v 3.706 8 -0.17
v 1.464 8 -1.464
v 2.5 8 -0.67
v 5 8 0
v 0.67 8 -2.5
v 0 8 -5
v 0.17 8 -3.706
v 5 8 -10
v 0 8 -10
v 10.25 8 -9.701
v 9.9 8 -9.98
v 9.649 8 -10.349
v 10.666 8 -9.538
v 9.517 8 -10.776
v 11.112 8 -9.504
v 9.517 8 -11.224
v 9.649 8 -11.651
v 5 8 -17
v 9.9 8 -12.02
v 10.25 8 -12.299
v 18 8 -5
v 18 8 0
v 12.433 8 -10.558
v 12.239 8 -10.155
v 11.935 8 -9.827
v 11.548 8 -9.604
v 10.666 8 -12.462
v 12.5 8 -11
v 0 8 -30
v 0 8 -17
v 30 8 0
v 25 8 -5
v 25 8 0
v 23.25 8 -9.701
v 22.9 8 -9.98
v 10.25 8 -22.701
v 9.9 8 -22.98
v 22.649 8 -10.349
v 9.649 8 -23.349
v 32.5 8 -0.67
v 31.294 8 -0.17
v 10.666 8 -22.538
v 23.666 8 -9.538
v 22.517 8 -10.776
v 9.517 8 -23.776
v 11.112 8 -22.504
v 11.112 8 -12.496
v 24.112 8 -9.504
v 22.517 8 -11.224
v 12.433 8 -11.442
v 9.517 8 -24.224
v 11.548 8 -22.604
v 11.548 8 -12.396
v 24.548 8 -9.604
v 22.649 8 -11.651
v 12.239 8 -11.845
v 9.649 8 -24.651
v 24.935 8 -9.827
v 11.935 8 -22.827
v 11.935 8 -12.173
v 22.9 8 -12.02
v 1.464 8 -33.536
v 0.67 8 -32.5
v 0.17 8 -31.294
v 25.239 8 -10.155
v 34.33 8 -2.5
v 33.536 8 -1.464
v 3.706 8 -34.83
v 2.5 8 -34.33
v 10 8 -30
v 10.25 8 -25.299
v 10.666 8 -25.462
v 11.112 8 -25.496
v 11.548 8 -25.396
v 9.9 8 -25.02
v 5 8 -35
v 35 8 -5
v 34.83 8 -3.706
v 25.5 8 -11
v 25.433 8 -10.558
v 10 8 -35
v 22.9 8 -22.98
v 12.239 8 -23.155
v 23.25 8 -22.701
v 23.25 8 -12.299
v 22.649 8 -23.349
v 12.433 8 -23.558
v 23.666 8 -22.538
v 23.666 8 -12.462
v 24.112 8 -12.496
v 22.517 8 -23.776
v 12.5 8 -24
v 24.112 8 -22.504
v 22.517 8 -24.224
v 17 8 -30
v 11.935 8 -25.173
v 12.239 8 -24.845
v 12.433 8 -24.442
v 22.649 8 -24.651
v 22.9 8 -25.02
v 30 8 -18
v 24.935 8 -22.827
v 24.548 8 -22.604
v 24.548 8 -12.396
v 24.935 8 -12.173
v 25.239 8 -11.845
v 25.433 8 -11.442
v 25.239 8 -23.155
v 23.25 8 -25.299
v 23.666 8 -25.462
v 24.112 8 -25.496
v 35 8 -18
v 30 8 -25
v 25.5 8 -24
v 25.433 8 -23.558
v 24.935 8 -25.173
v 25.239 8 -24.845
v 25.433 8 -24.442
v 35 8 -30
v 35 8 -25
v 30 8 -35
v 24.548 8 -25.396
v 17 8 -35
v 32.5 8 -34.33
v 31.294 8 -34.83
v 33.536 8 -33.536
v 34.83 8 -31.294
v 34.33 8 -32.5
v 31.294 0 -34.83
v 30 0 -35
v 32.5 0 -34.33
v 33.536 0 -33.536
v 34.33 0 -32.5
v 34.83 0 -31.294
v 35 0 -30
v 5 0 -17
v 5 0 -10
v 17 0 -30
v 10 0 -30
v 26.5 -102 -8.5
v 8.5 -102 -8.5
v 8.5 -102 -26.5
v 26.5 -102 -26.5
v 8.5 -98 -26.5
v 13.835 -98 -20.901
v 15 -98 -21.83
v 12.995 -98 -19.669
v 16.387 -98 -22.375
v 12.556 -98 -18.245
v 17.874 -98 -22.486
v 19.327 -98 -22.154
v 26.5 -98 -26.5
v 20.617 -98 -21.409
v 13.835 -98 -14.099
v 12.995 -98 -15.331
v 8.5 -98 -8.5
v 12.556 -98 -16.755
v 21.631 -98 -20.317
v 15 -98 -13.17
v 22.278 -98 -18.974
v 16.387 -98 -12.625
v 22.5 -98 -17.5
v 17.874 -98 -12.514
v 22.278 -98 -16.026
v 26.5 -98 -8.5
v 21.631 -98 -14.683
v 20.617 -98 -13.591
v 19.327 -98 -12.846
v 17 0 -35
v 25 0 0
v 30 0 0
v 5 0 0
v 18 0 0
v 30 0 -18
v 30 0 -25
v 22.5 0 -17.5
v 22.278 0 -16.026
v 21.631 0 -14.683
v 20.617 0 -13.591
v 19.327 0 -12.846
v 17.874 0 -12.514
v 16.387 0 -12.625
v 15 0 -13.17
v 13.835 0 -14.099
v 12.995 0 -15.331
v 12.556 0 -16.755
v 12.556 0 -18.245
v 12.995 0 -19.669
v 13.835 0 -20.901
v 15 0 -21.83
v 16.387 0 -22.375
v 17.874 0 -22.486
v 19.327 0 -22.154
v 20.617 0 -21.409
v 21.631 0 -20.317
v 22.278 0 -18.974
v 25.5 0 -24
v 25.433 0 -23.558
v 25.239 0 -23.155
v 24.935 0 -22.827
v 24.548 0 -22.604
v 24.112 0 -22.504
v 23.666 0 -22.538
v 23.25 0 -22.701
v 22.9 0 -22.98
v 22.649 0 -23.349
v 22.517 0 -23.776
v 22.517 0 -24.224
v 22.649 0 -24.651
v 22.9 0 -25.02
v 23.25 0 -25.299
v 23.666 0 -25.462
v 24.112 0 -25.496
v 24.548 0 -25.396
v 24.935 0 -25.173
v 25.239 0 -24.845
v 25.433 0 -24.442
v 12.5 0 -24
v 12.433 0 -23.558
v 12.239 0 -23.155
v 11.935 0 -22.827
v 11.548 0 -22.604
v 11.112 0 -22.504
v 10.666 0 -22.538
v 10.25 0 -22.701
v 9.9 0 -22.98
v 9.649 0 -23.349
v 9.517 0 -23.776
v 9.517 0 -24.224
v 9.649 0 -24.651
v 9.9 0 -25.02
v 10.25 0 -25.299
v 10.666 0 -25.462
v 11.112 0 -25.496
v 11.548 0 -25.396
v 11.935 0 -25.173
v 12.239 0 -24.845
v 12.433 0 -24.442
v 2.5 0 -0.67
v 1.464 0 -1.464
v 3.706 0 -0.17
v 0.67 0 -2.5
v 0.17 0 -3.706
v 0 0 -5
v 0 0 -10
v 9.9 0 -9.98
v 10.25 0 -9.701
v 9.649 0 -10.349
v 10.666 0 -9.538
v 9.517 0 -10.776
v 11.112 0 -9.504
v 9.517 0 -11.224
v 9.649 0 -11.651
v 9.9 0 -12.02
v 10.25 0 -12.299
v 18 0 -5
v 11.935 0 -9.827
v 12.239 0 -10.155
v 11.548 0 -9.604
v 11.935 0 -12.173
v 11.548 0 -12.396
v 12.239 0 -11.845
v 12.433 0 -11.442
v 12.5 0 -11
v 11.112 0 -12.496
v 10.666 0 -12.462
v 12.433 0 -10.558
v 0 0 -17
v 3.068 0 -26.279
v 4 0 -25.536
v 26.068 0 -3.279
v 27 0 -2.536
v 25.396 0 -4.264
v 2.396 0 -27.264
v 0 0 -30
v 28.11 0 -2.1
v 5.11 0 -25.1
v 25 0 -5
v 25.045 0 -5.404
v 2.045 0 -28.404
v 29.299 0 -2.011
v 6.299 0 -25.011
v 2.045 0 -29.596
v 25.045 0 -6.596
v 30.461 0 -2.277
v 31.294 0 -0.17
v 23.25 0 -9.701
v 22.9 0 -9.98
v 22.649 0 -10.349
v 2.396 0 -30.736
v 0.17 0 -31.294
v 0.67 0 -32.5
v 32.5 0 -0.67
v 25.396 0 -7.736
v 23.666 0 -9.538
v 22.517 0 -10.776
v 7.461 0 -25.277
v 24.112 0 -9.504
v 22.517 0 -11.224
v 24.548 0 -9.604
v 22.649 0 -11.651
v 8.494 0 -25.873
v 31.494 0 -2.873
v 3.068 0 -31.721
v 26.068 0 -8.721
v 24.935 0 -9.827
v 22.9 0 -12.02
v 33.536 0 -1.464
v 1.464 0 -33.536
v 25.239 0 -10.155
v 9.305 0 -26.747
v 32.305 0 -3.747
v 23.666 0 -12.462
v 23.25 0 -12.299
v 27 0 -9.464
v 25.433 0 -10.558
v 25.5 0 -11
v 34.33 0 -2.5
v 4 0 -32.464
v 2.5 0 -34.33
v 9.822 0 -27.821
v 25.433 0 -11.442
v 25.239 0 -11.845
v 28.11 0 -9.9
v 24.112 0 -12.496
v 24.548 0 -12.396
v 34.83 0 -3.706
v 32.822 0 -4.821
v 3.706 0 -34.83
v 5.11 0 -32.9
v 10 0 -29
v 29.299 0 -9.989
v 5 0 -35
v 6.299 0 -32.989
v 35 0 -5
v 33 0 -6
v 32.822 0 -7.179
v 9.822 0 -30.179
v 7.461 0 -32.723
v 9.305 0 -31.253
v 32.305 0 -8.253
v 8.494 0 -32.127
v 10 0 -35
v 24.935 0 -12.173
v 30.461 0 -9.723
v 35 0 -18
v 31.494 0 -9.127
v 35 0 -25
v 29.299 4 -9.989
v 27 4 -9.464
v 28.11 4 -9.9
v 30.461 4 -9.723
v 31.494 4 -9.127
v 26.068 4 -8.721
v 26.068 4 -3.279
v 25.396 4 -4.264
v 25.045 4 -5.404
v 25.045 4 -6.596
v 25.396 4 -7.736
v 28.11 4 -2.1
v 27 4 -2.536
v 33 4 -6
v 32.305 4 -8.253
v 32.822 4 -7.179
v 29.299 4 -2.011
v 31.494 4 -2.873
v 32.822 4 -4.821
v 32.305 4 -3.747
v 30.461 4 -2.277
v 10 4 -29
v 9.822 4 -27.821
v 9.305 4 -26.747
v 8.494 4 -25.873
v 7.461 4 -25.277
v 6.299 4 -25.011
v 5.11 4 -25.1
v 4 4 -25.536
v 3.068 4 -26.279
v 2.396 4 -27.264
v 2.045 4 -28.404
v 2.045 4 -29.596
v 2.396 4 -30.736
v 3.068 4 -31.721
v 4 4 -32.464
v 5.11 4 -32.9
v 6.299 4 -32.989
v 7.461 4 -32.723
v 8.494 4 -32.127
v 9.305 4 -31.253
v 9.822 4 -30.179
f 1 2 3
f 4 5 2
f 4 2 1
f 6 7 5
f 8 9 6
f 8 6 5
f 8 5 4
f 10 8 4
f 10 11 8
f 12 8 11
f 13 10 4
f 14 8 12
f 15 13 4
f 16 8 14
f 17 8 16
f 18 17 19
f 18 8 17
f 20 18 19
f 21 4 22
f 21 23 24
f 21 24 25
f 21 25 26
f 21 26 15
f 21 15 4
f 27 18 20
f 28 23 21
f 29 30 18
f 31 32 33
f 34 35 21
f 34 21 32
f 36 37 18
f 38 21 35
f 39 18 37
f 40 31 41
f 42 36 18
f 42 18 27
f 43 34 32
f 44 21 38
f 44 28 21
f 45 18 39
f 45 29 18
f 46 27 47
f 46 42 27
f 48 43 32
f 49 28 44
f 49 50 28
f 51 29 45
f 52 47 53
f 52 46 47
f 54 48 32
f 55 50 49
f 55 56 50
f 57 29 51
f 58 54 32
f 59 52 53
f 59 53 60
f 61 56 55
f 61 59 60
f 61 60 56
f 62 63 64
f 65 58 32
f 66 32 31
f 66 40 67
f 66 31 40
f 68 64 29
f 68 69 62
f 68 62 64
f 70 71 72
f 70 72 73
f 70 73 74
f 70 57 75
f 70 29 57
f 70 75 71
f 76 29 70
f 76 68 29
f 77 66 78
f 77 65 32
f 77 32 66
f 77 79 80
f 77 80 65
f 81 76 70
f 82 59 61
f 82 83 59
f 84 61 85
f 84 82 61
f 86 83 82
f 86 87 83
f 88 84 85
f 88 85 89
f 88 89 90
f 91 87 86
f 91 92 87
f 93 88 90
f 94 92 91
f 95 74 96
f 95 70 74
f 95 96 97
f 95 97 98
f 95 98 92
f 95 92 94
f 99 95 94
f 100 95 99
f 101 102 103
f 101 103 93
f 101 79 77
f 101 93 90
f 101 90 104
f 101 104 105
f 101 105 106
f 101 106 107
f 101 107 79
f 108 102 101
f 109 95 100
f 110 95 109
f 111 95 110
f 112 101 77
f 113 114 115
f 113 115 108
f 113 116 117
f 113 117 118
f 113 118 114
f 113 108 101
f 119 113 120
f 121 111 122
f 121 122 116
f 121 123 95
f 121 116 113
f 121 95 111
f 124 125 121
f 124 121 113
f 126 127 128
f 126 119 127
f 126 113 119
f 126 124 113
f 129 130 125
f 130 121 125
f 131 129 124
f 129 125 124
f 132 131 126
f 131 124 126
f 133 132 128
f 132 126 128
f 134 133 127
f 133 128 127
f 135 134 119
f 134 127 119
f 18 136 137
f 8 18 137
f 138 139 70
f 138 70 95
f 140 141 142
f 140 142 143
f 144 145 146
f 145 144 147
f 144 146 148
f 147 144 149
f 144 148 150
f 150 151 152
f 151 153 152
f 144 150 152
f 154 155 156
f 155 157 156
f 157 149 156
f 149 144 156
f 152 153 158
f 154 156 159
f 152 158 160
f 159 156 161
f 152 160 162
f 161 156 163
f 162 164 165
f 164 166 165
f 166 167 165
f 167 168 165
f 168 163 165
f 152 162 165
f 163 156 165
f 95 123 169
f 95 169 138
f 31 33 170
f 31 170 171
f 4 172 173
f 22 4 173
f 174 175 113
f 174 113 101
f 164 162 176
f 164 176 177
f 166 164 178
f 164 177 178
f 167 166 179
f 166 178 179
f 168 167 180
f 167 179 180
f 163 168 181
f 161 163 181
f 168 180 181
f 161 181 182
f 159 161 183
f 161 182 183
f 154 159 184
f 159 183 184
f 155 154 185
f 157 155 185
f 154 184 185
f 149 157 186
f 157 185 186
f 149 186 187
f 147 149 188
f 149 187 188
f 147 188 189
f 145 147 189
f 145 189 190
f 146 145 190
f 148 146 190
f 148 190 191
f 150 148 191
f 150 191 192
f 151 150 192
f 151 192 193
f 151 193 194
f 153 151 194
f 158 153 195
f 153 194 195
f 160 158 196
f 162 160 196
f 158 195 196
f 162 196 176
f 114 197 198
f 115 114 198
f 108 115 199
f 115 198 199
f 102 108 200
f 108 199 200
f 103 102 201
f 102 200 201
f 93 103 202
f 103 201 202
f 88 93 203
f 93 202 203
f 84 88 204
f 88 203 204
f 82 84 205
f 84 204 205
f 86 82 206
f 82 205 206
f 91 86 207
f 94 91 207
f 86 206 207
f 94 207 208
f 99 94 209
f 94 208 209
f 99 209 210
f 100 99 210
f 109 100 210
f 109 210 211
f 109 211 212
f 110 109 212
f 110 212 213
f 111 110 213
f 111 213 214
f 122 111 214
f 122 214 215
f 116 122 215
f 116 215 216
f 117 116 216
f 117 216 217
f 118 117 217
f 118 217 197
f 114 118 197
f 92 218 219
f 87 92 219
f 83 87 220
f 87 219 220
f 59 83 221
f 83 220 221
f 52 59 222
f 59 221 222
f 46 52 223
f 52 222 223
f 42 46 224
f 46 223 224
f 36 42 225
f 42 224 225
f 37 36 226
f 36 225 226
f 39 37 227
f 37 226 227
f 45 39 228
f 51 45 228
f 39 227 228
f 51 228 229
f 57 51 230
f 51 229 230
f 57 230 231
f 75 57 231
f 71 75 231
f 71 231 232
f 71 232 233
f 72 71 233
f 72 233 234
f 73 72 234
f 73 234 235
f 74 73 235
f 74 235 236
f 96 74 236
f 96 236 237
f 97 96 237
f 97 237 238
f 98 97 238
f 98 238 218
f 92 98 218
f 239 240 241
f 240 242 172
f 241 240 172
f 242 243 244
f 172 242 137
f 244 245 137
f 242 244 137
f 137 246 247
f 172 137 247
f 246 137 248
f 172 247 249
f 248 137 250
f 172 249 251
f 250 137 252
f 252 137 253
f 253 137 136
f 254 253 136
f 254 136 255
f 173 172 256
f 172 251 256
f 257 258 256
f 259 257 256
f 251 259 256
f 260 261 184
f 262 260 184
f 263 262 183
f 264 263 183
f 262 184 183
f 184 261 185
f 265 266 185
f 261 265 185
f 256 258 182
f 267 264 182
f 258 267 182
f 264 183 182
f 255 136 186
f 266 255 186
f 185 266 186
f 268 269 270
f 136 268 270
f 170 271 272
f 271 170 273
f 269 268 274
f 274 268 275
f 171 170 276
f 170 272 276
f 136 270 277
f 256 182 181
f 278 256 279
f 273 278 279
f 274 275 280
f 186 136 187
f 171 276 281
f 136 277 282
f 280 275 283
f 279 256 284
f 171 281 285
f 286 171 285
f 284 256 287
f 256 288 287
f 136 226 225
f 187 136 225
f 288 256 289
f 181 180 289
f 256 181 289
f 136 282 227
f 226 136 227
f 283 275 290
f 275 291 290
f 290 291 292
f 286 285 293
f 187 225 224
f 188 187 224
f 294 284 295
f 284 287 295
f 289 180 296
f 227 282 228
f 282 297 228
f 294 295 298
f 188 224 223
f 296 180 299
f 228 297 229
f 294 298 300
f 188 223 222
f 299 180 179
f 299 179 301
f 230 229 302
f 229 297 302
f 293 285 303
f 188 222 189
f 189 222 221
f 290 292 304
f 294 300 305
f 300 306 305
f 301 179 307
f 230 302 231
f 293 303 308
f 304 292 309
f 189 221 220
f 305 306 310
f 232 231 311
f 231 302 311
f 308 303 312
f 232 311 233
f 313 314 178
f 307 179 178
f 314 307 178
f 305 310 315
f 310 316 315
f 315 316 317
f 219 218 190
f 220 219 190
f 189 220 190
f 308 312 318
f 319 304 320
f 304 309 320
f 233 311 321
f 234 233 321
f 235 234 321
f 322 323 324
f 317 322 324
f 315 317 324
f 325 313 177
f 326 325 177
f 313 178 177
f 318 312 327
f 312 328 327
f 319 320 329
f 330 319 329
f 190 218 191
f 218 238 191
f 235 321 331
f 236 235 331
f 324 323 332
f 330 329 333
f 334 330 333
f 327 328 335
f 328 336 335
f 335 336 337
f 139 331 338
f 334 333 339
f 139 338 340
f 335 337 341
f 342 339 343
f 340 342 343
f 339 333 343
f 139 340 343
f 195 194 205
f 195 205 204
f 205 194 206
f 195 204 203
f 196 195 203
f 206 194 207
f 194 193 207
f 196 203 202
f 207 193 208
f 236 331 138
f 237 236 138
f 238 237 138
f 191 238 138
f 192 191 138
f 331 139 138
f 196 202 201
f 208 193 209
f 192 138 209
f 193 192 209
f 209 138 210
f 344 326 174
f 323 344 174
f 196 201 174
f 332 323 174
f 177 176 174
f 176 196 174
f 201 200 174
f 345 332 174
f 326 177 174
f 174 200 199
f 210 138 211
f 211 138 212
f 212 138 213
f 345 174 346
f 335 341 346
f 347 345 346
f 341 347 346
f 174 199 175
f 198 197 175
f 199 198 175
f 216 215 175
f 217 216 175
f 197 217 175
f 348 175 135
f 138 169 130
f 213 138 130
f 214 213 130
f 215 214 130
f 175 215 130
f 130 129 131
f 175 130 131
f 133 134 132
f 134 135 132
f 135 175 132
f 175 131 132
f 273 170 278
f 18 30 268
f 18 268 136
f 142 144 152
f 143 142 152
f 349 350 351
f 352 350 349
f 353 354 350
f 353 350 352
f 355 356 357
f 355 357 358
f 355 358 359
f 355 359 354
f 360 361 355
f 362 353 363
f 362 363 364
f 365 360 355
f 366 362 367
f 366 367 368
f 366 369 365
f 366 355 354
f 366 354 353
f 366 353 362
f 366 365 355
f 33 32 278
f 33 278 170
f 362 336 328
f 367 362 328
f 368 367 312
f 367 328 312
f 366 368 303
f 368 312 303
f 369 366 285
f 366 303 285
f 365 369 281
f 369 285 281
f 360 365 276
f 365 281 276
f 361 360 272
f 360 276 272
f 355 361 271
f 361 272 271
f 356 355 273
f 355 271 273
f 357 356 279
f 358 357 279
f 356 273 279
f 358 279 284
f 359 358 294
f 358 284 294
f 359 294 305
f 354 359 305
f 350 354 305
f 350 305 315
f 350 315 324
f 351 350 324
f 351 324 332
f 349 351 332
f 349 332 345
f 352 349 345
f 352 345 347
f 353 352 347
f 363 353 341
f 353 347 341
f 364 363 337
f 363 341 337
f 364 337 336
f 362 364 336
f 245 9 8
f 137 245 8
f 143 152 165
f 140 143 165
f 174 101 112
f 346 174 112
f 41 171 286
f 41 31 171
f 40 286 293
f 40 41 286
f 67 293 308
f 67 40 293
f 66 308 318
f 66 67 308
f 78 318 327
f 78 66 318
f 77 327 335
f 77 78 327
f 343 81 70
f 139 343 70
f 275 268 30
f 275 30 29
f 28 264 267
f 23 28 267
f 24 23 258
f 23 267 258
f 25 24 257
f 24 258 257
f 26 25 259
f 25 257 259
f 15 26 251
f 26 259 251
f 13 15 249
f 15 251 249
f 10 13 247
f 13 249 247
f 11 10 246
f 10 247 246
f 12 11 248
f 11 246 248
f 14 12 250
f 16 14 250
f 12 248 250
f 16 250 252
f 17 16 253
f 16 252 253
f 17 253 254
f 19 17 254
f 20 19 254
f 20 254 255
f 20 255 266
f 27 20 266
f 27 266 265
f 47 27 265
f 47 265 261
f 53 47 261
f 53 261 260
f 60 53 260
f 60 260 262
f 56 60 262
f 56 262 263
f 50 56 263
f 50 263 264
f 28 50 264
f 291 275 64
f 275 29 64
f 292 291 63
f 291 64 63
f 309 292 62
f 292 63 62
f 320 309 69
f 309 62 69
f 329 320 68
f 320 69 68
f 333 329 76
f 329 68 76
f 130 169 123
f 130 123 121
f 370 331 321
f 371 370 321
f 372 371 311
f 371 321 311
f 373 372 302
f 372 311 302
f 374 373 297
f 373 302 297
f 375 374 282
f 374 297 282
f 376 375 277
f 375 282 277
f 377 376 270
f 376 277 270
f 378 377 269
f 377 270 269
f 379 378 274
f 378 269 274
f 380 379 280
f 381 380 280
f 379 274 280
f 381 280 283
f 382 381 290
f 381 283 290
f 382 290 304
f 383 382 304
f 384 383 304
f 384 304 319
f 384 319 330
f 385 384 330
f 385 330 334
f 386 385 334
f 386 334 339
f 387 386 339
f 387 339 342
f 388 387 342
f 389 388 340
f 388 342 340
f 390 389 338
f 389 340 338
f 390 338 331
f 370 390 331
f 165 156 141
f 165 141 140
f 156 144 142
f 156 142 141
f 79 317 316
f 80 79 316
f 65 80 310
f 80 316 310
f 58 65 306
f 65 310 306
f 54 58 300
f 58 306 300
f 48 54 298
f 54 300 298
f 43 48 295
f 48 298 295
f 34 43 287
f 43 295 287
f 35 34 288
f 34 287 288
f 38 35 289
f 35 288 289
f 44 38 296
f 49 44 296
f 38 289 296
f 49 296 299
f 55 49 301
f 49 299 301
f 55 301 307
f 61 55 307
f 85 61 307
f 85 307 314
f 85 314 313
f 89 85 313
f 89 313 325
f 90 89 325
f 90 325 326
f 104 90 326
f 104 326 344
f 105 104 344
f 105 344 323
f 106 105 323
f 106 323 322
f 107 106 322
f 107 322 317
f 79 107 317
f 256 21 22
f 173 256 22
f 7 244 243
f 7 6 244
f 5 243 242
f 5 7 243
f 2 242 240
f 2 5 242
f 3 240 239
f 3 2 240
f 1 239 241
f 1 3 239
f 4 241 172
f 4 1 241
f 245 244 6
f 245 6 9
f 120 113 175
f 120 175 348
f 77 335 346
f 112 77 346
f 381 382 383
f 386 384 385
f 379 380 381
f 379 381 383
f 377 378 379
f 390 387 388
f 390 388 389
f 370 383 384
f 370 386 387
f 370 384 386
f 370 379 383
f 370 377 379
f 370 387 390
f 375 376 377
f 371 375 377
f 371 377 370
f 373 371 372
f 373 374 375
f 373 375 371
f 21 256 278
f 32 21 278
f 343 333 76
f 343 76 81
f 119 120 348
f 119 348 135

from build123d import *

# Parameters (mm, degrees)
SKETCH1_W           = 35
SKETCH1_H           = 35
BOSS_EXTRUDE1_DEPTH = 8
SKETCH2_W           = 7
SKETCH2_H           = 5
SKETCH2_W_2         = 5
SKETCH2_H_2         = 7
SKETCH2_R           = 1.5
CUT_EXTRUDE1_DEPTH  = 51.139804547
SKETCH2_5_R         = 4
SKETCH2_5_R_2       = 1.5
CUT_EXTRUDE2_DEPTH  = 4
SKETCH2_7_R         = 5
BOSS_EXTRUDE2_DEPTH = 98
SKETCH4_W           = 18
SKETCH4_H           = 18
BOSS_EXTRUDE3_DEPTH = 4
FILLET2_R           = 5


with BuildPart() as part:
    # Sketch1 → Boss-Extrude1 (new body)
    with BuildSketch(Plane(origin=(0, 0, 0), x_dir=(1, 0, 0), z_dir=(0, 1, 0))):
        with Locations((17.5, 17.5)):
            Rectangle(SKETCH1_W, SKETCH1_H)
    extrude(amount=BOSS_EXTRUDE1_DEPTH)

    # Sketch2 → Cut-Extrude1 (cut, through all)
    with BuildSketch(Plane.XZ):
        with Locations((21.5, -2.5)):
            Rectangle(SKETCH2_W, SKETCH2_H)
        with Locations((2.5, -13.5)):
            Rectangle(SKETCH2_W_2, SKETCH2_H_2)
        with Locations((32.5, -21.5)):
            Rectangle(SKETCH2_W_2, SKETCH2_H_2)
        with Locations((13.5, -32.5)):
            Rectangle(SKETCH2_W, SKETCH2_H)
        with Locations((11, -11)):
            Circle(SKETCH2_R)
        with Locations((24, -11)):
            Circle(SKETCH2_R)
        with Locations((24, -24)):
            Circle(SKETCH2_R)
        with Locations((11, -24)):
            Circle(SKETCH2_R)
    extrude(amount=-CUT_EXTRUDE1_DEPTH, mode=Mode.SUBTRACT)

    # Sketch2<5> → Cut-Extrude2 (cut)
    with BuildSketch(Plane.XZ):
        with Locations((29, -6)):
            Circle(SKETCH2_5_R)
        with Locations((6, -29)):
            Circle(SKETCH2_5_R)
        with Locations((11, -11)):
            Circle(SKETCH2_5_R_2)
    extrude(amount=-CUT_EXTRUDE2_DEPTH, mode=Mode.SUBTRACT)

    # Sketch2<7> → Boss-Extrude2 (add)
    with BuildSketch(Plane.XZ):
        with Locations((17.5, -17.5)):
            Circle(SKETCH2_7_R)
    extrude(amount=BOSS_EXTRUDE2_DEPTH)

    # Sketch4 → Boss-Extrude3 (add)
    with BuildSketch(Plane.XZ.offset(98)):
        with Locations((17.5, -17.5)):
            Rectangle(SKETCH4_W, SKETCH4_H)
    extrude(amount=BOSS_EXTRUDE3_DEPTH)

    # Fillet2
    fillet2_edges = [part.edges().sort_by_distance(p)[0] for p in [
        (35, 4, 0),
        (35, 4, -35),
        (0, 4, -35),
        (0, 4, 0),
    ]]
    fillet(fillet2_edges, radius=FILLET2_R)


solid = part.part
